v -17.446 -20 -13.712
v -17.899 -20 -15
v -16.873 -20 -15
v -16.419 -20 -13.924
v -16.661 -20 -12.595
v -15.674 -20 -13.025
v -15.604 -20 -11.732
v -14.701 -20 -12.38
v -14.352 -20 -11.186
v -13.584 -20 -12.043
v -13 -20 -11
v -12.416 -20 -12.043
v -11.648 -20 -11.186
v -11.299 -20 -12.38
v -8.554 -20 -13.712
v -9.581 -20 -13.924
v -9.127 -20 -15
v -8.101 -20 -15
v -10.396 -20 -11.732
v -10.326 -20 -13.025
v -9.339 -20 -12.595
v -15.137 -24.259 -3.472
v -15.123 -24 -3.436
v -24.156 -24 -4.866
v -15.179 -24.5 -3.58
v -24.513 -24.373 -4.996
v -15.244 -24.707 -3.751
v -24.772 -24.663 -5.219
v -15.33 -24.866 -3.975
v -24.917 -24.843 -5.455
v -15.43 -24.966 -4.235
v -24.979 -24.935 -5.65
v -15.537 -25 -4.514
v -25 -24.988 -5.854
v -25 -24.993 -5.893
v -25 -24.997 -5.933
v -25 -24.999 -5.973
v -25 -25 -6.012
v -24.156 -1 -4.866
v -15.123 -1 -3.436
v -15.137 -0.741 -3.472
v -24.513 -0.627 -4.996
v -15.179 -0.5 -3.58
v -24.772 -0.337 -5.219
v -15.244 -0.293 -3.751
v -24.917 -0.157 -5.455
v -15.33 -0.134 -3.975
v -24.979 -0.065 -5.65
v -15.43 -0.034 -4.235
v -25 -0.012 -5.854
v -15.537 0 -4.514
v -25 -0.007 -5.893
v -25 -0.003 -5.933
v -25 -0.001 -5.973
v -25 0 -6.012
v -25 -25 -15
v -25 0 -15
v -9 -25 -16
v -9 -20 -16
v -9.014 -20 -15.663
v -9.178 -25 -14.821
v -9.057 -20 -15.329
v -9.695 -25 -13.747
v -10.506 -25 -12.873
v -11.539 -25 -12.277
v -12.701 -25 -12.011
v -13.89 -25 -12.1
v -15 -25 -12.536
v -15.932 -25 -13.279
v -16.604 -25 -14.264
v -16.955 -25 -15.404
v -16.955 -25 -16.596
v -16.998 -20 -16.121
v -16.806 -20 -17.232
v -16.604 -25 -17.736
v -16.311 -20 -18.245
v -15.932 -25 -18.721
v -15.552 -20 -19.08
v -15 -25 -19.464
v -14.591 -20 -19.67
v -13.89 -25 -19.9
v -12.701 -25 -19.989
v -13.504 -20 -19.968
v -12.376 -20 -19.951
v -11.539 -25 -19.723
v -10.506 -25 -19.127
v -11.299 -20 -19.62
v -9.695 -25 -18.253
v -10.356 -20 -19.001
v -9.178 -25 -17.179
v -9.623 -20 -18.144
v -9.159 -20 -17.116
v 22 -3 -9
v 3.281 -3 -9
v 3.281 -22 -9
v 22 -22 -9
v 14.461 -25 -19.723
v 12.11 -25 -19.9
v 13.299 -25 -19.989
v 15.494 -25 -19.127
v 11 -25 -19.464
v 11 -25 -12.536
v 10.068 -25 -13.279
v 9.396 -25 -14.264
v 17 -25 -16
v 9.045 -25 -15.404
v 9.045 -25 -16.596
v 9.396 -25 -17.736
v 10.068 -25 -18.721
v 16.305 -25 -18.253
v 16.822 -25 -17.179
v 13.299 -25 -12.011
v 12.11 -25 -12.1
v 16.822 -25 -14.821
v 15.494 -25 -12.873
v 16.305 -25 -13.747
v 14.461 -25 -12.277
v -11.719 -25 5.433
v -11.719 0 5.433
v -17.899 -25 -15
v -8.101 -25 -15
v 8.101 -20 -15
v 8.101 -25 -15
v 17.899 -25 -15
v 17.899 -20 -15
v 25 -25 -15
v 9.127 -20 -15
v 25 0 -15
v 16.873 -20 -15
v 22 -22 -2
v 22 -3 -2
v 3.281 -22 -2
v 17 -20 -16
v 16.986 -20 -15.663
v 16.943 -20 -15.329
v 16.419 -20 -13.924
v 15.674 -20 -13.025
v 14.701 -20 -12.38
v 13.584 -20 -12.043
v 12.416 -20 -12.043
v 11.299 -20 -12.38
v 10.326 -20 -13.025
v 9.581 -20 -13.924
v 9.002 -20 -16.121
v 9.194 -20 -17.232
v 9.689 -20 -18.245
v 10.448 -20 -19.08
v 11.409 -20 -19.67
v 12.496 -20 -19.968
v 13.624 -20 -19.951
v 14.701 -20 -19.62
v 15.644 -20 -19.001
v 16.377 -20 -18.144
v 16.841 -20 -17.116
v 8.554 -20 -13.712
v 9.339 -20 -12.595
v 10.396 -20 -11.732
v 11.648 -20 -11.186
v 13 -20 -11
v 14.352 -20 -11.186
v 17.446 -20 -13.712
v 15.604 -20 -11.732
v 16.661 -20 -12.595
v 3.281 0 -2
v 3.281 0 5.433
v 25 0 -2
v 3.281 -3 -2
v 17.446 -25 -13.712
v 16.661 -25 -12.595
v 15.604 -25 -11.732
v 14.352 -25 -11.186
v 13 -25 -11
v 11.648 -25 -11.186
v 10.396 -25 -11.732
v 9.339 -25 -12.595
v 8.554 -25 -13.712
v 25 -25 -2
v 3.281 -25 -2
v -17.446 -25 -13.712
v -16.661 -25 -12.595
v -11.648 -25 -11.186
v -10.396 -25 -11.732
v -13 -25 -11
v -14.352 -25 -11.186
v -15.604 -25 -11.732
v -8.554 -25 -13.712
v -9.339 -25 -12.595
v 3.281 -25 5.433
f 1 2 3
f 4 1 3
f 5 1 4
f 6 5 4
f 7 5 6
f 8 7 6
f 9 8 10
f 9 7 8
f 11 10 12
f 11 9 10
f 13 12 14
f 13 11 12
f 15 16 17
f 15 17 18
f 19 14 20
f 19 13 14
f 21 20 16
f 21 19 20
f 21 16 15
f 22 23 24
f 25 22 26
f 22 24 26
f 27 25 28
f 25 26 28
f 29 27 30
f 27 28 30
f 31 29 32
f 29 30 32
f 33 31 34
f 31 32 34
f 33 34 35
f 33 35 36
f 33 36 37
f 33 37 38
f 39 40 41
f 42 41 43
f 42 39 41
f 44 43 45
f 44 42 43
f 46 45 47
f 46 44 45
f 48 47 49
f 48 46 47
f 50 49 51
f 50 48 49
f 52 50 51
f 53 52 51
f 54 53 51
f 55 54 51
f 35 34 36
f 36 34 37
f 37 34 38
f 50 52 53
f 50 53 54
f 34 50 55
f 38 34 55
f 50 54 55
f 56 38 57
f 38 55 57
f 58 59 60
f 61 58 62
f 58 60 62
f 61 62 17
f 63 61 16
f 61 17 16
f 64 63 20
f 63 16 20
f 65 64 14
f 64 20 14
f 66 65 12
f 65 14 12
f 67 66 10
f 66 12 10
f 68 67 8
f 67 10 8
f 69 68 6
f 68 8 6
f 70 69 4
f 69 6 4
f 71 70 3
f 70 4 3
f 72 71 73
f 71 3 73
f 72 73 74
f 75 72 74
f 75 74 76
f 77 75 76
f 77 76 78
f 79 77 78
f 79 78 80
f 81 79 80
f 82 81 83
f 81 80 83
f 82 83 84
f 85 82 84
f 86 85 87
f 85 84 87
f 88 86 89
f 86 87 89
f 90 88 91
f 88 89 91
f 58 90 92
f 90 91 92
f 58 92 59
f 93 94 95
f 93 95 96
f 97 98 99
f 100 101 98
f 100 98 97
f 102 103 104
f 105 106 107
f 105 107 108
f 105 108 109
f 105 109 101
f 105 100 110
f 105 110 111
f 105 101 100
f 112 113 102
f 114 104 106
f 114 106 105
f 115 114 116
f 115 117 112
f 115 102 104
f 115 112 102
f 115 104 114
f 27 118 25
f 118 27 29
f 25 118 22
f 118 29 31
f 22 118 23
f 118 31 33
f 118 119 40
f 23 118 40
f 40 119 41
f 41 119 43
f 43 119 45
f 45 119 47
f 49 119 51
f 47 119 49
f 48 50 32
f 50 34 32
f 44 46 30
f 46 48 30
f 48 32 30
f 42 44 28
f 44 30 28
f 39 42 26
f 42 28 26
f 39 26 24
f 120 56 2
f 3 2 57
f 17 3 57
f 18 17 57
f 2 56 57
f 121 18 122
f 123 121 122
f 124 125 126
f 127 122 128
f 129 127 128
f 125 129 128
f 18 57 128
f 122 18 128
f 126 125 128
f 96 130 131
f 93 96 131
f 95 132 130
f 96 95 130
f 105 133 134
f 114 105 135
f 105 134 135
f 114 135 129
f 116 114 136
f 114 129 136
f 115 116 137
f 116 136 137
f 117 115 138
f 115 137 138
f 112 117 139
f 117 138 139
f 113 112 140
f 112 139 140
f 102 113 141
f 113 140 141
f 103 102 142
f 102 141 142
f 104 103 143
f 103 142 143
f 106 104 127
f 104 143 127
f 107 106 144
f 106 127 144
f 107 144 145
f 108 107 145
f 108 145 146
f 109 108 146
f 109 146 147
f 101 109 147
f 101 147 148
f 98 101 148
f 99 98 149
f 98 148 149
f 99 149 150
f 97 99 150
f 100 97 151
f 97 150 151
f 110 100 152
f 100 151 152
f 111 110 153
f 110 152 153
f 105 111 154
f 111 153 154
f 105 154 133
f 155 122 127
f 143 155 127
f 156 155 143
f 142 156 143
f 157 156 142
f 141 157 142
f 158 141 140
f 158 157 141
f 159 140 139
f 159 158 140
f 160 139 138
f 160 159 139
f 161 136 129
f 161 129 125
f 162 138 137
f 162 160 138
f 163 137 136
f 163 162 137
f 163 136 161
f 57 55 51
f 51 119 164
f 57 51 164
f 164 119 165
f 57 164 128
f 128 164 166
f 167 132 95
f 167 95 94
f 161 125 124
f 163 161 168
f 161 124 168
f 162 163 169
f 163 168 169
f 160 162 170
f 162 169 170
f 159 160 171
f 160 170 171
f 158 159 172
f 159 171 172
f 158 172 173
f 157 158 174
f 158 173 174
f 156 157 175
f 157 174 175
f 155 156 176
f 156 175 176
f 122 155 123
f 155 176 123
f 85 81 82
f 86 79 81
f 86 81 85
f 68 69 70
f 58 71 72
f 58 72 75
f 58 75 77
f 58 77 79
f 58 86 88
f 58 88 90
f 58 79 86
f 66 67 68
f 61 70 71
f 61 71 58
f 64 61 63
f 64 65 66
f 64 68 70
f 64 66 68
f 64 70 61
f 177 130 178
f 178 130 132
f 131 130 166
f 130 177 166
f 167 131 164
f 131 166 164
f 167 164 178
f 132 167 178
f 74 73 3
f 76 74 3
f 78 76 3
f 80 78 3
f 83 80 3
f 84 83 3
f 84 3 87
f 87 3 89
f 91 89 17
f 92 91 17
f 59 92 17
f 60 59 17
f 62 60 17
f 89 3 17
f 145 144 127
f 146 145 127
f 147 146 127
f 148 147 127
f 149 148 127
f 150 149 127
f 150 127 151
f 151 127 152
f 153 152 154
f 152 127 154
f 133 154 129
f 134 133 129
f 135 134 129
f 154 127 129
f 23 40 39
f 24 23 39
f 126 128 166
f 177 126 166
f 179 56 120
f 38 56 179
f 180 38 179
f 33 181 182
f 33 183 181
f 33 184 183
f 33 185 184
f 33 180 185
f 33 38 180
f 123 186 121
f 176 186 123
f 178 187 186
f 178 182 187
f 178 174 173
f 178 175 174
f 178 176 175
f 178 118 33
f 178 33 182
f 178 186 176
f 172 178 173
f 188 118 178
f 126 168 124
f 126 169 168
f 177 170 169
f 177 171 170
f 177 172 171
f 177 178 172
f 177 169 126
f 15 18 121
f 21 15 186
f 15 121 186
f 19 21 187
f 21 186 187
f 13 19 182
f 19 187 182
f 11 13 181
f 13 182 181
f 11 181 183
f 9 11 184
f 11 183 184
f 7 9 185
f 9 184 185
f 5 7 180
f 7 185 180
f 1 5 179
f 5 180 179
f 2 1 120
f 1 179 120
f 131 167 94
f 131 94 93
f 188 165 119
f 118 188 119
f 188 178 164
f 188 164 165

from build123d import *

# Parameters (mm, degrees)
F1_DEPTH = 25
F2_W     = 18.718621
F2_H     = 19
F3_DEPTH = 7
F4_R     = 1
F5_R     = 5
F6_DEPTH = 5
F7_R     = 4
F8_DEPTH = 5


with BuildPart() as f1:
    # F0 (on Front) → F1 (new body)
    with BuildSketch(Plane.XZ):
        Polygon((-25, -5), (-25, -15), (25, -15), (25, -6), (25, -2), (3.281379, -2), (3.281379, 5.433359), (-11.718621, 5.433359), (-15.123117, -3.435655), align=None)
    extrude(amount=F1_DEPTH)

    # F2 (on face) → F3 (cut)
    with BuildSketch(Plane.XY.offset(-2)):
        with Locations((12.64069, -12.5)):
            Rectangle(F2_W, F2_H)
    extrude(amount=-F3_DEPTH, mode=Mode.SUBTRACT)

    # F4
    f4_edges = [f1.edges().sort_by_distance(p)[0] for p in [
        (-20.061558, 0, -4.217828),
        (-20.061558, -25, -4.217828),
        (-25, -12.5, -5),
    ]]
    fillet(f4_edges, radius=F4_R)

    # F5 (on face) → F6 (cut)
    with BuildSketch(Plane.XZ.offset(25)):
        with Locations((-13, -16)):
            Circle(F5_R)
        with Locations((13, -16)):
            Circle(F5_R)
    extrude(amount=-F6_DEPTH, mode=Mode.SUBTRACT)

    # F7 (on face) → F8 (join, through all)
    with BuildSketch(Plane.XZ.offset(20)):
        with Locations((-13, -16)):
            Circle(F7_R)
        with Locations((13, -16)):
            Circle(F7_R)
    extrude(amount=F8_DEPTH)


solid = f1.part
